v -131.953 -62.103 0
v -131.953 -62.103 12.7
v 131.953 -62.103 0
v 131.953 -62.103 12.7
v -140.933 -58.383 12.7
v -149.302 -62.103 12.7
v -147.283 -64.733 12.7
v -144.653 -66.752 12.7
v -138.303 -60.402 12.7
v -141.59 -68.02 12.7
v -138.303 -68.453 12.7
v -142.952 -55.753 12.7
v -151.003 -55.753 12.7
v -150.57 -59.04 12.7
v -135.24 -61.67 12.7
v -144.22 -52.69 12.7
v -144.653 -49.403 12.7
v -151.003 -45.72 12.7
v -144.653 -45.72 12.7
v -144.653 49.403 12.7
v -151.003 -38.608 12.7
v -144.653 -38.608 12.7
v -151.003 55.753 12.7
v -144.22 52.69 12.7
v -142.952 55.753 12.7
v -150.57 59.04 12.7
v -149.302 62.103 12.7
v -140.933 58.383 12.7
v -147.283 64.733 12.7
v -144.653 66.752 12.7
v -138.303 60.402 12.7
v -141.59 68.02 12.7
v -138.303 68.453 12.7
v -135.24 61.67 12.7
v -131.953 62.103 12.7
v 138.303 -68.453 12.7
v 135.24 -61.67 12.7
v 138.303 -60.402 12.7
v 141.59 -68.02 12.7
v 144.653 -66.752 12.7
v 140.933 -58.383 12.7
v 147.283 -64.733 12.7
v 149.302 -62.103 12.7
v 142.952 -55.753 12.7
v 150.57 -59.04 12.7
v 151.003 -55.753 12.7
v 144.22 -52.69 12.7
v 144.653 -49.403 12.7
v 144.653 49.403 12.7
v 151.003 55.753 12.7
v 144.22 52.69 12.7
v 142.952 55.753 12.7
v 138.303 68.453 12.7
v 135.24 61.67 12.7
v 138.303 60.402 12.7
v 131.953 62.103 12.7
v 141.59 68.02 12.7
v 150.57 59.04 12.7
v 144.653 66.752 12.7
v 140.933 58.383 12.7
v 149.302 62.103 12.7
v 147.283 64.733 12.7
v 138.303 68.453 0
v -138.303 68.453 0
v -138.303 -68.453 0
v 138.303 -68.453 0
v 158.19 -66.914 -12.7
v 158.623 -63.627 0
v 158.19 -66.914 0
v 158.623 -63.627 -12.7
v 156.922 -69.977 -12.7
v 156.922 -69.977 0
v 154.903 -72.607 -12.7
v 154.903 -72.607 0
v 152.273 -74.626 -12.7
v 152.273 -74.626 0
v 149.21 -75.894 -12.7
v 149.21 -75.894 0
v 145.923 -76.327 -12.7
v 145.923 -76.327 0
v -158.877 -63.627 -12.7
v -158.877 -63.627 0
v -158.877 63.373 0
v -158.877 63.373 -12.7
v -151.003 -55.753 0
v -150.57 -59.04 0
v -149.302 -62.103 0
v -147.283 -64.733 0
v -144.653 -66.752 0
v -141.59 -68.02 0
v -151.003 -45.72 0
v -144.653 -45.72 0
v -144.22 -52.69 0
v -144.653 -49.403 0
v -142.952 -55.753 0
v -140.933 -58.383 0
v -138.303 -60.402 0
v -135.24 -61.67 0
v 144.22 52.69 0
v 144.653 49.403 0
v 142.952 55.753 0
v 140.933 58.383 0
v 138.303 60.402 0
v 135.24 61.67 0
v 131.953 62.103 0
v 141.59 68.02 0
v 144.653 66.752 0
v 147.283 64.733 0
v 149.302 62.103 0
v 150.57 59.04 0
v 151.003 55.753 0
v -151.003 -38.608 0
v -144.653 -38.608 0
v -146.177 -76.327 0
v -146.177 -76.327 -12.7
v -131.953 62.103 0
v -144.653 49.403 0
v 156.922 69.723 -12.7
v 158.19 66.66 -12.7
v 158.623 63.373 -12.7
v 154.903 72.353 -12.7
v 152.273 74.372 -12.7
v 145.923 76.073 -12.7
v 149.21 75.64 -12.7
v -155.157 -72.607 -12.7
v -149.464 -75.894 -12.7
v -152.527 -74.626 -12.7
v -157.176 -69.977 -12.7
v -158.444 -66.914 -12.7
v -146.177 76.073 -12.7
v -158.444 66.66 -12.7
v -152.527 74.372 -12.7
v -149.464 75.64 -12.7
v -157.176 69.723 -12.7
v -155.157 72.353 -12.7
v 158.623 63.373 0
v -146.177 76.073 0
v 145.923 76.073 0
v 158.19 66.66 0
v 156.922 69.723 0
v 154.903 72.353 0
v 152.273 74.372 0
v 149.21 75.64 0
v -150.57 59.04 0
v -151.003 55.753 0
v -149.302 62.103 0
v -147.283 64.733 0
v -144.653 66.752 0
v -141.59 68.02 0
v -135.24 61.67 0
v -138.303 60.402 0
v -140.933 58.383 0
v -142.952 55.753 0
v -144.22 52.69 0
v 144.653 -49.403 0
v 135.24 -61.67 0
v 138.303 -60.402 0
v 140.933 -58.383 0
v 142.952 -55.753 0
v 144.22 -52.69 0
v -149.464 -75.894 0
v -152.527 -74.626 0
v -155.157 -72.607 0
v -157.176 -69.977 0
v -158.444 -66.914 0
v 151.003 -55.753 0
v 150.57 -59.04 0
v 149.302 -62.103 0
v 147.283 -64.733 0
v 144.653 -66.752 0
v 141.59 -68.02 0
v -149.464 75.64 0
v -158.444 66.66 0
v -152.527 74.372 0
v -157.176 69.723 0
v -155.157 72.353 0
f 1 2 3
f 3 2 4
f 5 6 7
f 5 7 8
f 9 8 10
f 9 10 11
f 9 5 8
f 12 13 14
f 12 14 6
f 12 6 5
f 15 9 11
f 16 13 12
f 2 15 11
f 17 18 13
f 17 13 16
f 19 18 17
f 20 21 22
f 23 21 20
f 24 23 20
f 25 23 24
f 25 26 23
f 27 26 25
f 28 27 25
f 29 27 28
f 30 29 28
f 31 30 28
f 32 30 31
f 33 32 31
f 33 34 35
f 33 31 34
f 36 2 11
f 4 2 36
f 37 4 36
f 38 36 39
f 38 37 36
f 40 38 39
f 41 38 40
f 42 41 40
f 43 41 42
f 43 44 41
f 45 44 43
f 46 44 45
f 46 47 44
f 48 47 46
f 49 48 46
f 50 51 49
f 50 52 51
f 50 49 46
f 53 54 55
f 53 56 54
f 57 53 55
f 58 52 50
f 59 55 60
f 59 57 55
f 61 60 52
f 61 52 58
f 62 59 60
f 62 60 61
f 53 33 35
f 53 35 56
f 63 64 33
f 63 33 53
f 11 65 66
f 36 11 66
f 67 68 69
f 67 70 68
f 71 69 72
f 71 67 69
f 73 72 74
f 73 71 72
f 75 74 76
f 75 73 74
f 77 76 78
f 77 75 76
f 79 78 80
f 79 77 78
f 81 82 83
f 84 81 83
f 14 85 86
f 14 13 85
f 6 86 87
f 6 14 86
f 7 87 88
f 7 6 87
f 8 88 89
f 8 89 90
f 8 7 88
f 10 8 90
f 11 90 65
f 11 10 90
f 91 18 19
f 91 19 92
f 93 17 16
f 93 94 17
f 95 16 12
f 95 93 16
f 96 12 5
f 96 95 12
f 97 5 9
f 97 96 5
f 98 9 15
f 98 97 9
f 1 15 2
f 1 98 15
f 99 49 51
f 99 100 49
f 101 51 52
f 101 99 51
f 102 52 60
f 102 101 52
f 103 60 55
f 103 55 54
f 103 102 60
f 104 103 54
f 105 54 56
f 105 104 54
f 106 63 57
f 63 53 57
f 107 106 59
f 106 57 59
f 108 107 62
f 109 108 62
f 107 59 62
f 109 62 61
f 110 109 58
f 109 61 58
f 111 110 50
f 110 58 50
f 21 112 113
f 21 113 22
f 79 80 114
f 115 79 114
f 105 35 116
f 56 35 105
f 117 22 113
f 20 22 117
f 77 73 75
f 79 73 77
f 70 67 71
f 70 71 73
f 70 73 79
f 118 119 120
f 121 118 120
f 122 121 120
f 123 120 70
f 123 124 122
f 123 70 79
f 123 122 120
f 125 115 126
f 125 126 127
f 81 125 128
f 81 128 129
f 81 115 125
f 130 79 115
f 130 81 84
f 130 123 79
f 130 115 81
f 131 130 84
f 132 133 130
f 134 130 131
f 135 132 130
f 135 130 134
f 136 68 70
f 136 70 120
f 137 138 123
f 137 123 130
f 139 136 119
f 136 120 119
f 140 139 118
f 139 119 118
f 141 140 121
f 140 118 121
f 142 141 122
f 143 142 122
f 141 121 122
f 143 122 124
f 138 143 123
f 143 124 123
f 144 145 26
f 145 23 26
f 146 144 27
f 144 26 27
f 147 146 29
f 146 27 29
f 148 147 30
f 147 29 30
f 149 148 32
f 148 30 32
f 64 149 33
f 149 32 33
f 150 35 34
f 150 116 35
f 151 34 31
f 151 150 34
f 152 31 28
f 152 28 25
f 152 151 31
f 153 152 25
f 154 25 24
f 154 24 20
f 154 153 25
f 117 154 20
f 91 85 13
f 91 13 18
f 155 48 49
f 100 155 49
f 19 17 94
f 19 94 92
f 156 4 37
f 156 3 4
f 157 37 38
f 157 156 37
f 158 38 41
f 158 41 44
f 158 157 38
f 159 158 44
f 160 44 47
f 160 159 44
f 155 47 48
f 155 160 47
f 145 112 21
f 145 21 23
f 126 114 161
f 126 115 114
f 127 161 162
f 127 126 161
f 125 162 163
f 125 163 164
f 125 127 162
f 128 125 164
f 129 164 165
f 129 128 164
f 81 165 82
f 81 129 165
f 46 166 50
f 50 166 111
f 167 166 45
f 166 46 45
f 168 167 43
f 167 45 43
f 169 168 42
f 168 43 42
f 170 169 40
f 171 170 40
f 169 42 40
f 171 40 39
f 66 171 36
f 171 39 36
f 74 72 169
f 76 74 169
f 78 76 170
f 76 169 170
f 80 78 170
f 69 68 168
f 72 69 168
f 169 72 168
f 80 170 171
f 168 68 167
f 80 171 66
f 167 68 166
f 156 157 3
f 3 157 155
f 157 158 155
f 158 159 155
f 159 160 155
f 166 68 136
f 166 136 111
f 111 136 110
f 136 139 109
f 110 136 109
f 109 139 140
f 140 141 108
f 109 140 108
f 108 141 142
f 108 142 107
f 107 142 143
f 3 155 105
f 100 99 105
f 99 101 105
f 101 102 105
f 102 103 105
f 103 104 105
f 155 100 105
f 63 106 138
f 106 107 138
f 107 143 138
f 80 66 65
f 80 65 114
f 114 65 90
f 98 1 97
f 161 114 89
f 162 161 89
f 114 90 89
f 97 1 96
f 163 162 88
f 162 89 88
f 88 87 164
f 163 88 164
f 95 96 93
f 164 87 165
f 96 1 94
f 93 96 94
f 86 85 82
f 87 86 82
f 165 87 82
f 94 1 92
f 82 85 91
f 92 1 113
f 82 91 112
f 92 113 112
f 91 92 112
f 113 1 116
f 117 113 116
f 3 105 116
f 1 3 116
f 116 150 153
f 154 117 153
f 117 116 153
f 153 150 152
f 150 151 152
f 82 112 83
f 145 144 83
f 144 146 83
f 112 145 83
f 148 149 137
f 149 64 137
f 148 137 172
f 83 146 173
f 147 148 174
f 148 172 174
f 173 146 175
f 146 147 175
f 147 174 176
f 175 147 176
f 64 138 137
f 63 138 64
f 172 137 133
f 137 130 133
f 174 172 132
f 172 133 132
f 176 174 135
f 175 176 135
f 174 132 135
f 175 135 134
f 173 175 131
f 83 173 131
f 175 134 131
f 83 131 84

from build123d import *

# Parameters (mm, degrees)
SKETCH2_W           = 302.006
SKETCH2_H           = 136.906
BOSS_EXTRUDE1_DEPTH = 12.7
SKETCH3_W           = 317.5
SKETCH3_H           = 152.4
BOSS_EXTRUDE2_DEPTH = 12.7
SKETCH4_W           = 289.306
SKETCH4_H           = 124.206
CUT_EXTRUDE1_DEPTH  = 12.7
CUT_EXTRUDE3_REACH  = 311.626
FILLET1_R           = 12.7


with BuildPart() as part:
    # Sketch2 → Boss-Extrude1 (new body)
    with BuildSketch(Plane.XY):
        Rectangle(SKETCH2_W, SKETCH2_H)
    extrude(amount=BOSS_EXTRUDE1_DEPTH)

    # Sketch3 → Boss-Extrude2 (add)
    with BuildSketch(Plane(origin=(0, 0, 0), x_dir=(-1, 0, 0), z_dir=(0, 0, -1))):
        with Locations((0.127, -0.127)):
            Rectangle(SKETCH3_W, SKETCH3_H)
    extrude(amount=BOSS_EXTRUDE2_DEPTH)

    # Sketch4 → Cut-Extrude1 (cut)
    with BuildSketch(Plane.XY.offset(12.7)):
        Rectangle(SKETCH4_W, SKETCH4_H)
    extrude(amount=-CUT_EXTRUDE1_DEPTH, mode=Mode.SUBTRACT)

    # Sketch5 → Cut-Extrude3 (cut, up to next)
    with BuildSketch(Plane.ZY.offset(151.003), mode=Mode.PRIVATE) as cut_extrude3_sk1:
        with BuildLine():
            Line((12.7, -45.72), (0, -45.72))
            Line((0, -45.72), (0, -38.608))
            Line((0, -38.608), (12.7, -38.608))
            ThreePointArc((12.7, -38.608), (16.256, -42.164), (12.7, -45.72))
        make_face()
    cut_extrude3_tool1 = extrude(cut_extrude3_sk1.sketch, amount=-CUT_EXTRUDE3_REACH, mode=Mode.PRIVATE) & part.part
    add(cut_extrude3_tool1.solids().sort_by_distance((-151.003, -42.164, 7.766768))[0], mode=Mode.SUBTRACT)

    # Fillet1
    fillet1_edges = [part.edges().sort_by_distance(p)[0] for p in [
        (-158.877, -76.327, -6.35),
        (-158.877, 76.073, -6.35),
        (158.623, 76.073, -6.35),
        (158.623, -76.327, -6.35),
        (-144.653, 62.103, 6.35),
        (144.653, 62.103, 6.35),
        (144.653, -62.103, 6.35),
        (-144.653, -62.103, 6.35),
        (-151.003, 68.453, 6.35),
        (151.003, 68.453, 6.35),
        (151.003, -68.453, 6.35),
        (-151.003, -68.453, 6.35),
    ]]
    fillet(fillet1_edges, radius=FILLET1_R)


solid = part.part
